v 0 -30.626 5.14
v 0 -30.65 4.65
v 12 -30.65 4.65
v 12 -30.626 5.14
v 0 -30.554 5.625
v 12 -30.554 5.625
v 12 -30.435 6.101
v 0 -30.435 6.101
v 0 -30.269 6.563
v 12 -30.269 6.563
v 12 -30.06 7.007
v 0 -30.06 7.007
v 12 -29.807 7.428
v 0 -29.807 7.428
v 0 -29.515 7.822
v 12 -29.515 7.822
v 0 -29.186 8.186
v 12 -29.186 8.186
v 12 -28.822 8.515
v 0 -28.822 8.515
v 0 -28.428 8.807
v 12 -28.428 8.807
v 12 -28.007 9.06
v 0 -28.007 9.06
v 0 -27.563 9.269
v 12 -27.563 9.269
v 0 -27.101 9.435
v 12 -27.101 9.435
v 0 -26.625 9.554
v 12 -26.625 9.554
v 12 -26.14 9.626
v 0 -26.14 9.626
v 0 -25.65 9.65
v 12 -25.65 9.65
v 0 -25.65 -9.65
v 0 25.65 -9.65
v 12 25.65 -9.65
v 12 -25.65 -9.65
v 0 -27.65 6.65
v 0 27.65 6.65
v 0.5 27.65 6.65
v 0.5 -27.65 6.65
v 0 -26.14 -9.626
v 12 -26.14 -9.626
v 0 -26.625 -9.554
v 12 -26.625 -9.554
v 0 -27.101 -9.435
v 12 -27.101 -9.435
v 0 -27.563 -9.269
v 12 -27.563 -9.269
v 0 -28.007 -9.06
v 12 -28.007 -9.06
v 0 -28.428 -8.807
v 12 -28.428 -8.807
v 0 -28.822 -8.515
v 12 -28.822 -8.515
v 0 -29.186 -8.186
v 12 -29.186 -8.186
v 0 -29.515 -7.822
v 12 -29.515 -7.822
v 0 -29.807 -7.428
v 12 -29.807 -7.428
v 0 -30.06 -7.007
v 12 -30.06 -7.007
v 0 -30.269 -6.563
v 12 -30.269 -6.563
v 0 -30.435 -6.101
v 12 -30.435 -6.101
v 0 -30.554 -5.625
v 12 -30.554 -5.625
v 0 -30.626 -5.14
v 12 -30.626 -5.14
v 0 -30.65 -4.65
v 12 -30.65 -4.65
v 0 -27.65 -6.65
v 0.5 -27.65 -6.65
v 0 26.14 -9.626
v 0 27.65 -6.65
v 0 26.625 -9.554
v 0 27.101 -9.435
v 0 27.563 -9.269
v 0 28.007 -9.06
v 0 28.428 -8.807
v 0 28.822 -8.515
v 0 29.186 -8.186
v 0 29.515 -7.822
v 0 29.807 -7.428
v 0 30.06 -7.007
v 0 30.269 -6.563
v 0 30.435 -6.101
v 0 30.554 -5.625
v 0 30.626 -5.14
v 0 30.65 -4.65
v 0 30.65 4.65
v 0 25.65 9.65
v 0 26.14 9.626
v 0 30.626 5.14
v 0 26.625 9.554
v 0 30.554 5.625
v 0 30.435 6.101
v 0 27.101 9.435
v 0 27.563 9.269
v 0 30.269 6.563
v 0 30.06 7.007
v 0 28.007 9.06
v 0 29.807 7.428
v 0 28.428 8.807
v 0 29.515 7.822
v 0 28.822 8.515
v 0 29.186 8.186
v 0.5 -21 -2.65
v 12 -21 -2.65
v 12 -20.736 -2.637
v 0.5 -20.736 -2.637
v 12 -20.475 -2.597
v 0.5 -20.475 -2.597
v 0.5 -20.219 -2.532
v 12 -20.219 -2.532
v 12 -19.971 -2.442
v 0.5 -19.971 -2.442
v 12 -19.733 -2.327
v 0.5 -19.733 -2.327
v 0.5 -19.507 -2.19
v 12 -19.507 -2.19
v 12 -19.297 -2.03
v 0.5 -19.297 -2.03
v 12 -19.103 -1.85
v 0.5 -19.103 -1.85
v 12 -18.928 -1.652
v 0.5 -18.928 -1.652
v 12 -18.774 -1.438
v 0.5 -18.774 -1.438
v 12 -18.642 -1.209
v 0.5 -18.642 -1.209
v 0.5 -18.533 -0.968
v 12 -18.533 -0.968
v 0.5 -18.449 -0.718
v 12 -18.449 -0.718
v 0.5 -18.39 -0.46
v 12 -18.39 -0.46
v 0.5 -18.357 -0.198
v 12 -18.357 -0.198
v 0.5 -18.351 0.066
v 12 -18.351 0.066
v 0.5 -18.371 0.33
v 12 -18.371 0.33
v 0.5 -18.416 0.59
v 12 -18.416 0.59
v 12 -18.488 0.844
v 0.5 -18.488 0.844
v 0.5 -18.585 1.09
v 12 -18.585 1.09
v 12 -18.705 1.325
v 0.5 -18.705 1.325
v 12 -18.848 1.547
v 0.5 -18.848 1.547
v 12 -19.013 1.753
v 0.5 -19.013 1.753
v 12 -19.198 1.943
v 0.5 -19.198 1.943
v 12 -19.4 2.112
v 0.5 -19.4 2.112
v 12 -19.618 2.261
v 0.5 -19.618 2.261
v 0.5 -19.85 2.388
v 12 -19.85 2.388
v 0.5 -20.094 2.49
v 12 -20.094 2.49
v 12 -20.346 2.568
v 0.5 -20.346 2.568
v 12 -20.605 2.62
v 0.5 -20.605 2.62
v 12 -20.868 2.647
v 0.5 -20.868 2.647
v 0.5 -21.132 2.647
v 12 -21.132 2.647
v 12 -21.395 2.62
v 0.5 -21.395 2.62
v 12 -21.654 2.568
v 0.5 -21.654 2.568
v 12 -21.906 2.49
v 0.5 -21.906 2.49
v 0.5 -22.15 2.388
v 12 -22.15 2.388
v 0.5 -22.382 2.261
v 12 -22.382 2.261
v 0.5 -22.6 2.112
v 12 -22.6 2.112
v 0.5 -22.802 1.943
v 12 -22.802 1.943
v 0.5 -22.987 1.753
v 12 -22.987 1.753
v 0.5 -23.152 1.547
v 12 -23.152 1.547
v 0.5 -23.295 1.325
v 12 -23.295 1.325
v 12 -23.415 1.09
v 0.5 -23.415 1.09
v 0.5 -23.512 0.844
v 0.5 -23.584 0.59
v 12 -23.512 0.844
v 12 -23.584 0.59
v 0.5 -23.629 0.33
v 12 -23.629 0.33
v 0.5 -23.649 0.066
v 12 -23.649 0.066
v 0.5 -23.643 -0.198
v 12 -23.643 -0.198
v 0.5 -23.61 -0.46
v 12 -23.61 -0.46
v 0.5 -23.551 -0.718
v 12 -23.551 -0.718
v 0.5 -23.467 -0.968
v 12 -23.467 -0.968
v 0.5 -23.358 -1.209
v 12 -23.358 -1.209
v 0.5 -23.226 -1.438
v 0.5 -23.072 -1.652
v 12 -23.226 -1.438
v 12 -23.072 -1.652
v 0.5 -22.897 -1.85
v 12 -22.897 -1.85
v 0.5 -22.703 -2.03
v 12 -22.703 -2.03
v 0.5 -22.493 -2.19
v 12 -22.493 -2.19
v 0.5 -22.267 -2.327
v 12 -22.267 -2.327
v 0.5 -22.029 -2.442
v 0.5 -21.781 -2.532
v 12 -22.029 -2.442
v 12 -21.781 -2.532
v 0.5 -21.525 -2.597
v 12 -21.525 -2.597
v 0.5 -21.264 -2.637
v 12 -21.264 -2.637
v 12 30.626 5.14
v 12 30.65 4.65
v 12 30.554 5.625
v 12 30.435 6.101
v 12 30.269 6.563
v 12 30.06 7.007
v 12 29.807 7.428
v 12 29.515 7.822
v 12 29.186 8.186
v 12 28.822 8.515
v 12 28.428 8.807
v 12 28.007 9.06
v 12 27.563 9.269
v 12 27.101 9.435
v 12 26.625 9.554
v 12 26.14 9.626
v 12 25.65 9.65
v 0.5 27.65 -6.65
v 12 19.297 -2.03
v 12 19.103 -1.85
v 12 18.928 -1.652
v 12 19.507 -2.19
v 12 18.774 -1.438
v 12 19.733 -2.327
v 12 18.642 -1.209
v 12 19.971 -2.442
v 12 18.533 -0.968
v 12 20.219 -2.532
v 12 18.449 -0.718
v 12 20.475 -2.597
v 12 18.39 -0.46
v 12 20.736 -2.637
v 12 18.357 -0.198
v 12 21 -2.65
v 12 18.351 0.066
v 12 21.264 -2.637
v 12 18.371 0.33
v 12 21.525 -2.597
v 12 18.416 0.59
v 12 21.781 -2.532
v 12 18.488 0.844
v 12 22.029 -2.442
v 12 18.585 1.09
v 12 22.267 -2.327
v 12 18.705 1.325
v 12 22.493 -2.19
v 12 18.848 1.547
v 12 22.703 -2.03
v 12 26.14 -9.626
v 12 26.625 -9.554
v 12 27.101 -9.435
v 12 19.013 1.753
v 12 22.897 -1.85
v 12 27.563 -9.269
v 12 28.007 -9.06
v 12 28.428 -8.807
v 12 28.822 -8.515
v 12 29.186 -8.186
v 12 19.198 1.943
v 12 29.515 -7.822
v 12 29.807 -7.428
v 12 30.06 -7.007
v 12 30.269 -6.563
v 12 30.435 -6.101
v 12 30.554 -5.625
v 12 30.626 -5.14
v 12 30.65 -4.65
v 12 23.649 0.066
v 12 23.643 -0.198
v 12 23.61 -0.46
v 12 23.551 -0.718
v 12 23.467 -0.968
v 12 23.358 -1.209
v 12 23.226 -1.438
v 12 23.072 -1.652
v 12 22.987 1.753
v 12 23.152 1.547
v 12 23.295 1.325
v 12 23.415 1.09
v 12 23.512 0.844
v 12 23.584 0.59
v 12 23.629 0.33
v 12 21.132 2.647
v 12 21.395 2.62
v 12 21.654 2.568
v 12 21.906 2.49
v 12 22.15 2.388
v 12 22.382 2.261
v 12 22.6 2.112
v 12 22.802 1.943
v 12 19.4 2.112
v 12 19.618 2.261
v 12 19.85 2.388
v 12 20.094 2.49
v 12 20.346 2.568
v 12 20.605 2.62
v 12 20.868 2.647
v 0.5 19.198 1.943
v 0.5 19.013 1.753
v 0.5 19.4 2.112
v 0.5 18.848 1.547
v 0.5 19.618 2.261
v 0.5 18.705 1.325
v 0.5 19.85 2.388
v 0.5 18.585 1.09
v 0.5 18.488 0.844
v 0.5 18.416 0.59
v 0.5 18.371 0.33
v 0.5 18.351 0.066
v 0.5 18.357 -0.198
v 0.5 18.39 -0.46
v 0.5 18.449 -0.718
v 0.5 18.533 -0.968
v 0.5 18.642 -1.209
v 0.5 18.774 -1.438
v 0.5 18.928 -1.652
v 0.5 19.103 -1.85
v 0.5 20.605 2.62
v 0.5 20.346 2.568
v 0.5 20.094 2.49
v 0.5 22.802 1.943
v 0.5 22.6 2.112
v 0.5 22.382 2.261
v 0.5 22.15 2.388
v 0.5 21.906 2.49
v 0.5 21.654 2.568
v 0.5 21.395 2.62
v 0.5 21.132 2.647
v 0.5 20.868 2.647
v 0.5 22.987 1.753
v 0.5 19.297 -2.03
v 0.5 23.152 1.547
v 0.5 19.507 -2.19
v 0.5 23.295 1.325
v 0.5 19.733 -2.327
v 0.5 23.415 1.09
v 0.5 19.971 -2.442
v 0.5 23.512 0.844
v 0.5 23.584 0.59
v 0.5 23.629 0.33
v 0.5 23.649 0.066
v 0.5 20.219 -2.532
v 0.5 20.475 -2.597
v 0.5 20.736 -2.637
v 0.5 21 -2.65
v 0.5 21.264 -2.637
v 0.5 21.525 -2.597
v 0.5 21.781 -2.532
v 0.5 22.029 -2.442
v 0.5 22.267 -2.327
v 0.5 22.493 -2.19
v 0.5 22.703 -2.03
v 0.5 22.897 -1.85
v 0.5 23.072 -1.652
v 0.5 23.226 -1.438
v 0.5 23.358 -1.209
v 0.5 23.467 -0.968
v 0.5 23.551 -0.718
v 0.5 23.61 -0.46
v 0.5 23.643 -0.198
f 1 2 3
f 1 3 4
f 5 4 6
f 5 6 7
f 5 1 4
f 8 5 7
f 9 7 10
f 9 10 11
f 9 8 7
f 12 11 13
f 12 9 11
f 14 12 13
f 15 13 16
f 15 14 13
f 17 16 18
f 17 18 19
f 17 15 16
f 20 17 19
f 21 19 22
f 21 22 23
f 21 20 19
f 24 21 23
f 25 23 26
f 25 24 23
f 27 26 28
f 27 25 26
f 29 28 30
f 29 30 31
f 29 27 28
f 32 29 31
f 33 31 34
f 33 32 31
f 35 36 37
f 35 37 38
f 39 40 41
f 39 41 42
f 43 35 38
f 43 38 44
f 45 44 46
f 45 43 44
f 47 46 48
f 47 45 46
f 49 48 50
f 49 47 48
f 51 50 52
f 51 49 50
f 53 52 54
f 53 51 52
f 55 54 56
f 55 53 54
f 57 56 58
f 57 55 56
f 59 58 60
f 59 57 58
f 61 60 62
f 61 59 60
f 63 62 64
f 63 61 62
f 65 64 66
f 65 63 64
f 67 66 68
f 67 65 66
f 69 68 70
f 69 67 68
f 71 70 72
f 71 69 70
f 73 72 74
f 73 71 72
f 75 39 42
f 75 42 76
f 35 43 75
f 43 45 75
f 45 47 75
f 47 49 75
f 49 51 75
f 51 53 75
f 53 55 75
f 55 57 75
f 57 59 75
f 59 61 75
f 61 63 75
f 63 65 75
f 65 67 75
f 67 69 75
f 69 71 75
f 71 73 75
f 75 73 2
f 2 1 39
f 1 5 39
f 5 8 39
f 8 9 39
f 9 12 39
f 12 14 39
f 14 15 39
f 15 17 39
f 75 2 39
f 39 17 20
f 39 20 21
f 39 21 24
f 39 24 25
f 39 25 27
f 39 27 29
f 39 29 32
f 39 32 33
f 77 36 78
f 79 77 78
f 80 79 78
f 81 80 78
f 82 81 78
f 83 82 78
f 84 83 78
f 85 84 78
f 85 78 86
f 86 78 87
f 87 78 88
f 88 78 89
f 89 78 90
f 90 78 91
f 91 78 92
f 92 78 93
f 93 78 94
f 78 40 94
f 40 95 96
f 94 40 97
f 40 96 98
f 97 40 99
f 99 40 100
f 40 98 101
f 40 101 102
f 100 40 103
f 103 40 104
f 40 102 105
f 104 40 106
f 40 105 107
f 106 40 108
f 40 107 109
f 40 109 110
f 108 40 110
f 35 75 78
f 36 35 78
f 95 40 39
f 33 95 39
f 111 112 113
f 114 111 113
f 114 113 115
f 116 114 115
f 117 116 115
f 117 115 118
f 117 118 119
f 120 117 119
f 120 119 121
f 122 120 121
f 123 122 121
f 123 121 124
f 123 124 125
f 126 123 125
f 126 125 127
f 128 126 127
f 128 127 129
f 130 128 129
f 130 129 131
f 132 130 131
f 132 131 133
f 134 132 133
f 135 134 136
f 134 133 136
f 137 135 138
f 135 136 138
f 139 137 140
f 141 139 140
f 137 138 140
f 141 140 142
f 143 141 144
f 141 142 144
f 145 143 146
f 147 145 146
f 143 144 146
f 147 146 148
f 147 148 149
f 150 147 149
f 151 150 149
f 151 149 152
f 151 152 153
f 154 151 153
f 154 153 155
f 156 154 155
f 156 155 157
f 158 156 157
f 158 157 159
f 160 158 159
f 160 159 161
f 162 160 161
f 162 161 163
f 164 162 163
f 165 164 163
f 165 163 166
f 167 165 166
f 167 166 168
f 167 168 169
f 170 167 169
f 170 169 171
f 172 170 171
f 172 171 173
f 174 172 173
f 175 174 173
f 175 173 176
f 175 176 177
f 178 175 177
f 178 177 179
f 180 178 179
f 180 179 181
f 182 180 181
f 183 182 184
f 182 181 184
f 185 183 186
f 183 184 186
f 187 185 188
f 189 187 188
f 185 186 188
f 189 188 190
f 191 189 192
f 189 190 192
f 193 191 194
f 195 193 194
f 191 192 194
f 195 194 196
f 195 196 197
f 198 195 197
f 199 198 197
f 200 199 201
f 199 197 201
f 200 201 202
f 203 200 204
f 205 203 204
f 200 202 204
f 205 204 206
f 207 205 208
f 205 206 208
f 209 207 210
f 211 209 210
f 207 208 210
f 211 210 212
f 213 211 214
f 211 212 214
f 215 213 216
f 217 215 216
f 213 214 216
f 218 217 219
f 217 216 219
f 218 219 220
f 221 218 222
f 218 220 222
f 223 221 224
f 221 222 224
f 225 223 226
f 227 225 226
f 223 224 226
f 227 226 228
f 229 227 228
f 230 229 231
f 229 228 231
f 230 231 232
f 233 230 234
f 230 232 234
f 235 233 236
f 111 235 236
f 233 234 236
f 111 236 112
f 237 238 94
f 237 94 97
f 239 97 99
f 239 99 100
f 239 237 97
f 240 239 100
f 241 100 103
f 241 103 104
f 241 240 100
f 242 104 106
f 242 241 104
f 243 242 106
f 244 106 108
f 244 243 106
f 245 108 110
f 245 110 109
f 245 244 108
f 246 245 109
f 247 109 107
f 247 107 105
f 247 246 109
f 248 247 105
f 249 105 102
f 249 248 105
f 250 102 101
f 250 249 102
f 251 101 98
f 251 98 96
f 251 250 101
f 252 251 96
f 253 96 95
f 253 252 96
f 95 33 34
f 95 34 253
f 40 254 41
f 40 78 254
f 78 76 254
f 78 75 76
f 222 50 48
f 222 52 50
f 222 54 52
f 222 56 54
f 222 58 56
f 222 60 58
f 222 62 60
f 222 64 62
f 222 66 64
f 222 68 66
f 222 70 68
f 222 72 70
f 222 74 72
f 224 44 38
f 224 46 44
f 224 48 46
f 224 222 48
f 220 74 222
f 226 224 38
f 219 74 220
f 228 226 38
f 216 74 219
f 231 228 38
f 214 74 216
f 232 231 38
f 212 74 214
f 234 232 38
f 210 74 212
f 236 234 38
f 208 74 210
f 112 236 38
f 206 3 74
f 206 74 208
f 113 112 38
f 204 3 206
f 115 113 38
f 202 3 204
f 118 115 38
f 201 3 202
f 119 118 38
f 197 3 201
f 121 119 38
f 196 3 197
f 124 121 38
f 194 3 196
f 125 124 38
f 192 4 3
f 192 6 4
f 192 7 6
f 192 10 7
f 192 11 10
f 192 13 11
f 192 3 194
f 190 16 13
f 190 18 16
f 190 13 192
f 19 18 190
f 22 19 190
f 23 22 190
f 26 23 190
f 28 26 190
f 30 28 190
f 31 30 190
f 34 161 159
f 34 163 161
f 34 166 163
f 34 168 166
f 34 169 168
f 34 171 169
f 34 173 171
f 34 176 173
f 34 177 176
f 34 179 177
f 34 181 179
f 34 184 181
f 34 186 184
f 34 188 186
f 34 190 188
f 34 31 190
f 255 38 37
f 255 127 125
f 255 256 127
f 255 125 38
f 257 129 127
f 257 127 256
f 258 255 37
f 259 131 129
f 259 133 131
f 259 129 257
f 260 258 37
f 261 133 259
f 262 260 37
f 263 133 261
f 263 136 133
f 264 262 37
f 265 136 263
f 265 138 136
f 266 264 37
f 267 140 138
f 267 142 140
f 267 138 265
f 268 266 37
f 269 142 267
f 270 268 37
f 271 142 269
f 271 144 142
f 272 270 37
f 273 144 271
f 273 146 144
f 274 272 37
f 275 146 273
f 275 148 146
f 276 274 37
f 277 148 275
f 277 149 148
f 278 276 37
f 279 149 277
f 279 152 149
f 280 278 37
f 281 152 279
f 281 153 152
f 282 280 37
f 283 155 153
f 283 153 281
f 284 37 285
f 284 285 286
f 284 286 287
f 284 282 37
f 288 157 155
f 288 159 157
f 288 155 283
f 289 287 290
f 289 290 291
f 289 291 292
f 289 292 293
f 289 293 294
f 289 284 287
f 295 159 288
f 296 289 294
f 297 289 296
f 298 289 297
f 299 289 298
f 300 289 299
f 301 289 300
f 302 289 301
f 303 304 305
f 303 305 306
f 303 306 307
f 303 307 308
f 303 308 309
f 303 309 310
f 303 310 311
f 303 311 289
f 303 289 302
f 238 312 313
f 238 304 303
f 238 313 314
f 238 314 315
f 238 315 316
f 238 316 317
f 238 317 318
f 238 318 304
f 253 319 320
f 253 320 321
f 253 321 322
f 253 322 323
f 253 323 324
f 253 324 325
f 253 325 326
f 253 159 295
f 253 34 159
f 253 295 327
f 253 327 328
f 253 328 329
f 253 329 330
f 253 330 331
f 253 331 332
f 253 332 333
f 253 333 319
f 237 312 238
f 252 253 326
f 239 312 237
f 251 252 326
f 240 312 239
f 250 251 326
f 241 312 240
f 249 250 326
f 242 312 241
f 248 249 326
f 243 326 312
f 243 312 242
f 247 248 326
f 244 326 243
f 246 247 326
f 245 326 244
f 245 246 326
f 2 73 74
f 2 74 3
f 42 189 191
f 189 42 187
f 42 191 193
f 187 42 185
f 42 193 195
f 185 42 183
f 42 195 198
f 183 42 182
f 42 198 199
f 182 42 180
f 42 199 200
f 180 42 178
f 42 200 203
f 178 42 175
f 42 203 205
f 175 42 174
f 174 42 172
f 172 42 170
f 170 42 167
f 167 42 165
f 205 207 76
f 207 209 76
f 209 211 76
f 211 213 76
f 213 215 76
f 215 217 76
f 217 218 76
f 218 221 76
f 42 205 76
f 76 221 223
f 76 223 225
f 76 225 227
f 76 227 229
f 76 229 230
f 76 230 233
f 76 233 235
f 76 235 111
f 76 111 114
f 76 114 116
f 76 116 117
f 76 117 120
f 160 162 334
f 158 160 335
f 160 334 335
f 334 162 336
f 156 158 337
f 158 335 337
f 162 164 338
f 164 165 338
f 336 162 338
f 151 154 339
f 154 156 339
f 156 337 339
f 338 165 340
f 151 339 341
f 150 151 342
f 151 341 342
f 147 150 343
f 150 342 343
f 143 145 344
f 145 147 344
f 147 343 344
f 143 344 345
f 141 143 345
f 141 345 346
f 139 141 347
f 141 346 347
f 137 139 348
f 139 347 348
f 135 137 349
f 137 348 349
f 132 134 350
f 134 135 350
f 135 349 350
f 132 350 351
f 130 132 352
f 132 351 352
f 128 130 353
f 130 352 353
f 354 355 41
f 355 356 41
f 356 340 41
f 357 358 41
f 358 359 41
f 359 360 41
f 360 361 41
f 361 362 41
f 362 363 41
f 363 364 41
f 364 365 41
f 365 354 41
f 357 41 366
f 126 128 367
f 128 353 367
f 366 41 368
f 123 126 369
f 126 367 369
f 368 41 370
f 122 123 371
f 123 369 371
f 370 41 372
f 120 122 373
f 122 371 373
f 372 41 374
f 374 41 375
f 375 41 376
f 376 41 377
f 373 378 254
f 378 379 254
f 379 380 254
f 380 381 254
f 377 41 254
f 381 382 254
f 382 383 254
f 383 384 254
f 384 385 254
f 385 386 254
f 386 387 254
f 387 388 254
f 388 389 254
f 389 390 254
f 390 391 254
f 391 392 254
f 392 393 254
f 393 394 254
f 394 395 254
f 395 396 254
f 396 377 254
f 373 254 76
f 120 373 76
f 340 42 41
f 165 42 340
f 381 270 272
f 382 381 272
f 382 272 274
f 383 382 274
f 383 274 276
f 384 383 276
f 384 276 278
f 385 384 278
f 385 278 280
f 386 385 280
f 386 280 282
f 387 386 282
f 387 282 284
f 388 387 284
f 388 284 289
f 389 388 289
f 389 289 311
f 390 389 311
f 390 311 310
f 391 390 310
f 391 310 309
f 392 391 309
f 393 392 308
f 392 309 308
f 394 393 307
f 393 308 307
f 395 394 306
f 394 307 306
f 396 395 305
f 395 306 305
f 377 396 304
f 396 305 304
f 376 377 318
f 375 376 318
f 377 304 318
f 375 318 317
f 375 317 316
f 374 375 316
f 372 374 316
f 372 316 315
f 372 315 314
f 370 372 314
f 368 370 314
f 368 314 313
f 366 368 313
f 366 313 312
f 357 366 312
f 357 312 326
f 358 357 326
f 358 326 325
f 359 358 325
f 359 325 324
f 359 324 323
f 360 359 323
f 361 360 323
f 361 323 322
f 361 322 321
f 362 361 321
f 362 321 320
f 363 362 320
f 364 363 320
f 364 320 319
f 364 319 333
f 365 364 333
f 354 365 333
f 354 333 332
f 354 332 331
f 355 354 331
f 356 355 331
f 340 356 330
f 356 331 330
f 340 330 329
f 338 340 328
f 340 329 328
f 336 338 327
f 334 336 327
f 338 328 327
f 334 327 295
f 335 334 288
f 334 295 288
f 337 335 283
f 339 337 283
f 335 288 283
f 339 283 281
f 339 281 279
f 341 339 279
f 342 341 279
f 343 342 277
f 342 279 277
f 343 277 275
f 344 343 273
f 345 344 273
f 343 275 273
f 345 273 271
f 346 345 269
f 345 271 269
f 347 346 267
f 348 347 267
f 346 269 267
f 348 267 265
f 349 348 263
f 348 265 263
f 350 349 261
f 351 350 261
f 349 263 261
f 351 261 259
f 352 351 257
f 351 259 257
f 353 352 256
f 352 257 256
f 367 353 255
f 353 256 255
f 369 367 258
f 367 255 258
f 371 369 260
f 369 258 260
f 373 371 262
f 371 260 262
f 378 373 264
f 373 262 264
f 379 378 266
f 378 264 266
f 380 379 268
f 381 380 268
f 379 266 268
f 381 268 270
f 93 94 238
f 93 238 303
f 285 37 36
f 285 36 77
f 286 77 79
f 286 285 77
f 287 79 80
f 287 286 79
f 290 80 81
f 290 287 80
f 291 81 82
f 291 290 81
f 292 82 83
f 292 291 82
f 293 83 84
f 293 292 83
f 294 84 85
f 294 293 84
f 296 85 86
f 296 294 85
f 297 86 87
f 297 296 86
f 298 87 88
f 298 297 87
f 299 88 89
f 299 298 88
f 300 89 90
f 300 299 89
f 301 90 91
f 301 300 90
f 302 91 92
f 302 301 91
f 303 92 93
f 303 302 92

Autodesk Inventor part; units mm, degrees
ref_plane "YZ Plane" through (0, 0, 0) normal (1, 0, 0) x (0, 1, 0)
ref_plane "XZ Plane" through (0, 0, 0) normal (0, 1, 0) x (-1, 0, 0)
ref_plane "XY Plane" through (0, 0, 0) normal (0, 0, 1) x (1, 0, 0)
sketch "Sketch1" plane through (0, 0, 0) normal (1, 0, 0) x (0, 1, 0)
  line L0 (27.65, 6.65) -> (-27.65, 6.65)
  line L1 (-27.65, 6.65) -> (-27.65, -6.65)
  line L2 (-27.65, -6.65) -> (27.65, -6.65)
  line L3 (27.65, -6.65) -> (27.65, 6.65)
  line L4 (27.65, 6.65) -> (-27.65, -6.65) construction
  line L5 (-27.65, 6.65) -> (27.65, -6.65) construction
  line L6 (30.65, -9.65) -> (-30.65, -9.65)
  line L7 (-30.65, -9.65) -> (-30.65, 9.65)
  line L8 (-30.65, 9.65) -> (30.65, 9.65)
  line L9 (30.65, 9.65) -> (30.65, -9.65)
  point P0 (0, 0)
  dimension "d0" = 55.3
  dimension "d1" = 13.3
  dimension "d2" = 3
extrude "Extrusion1" add sketch "Sketch1" along normal blind 12
sketch "Sketch2" plane through (12, 0, 0) normal (1, 0, 0) x (0, 0, -1)
  line L0 (-9.65, 30.65) -> (-9.65, -30.65) projected
  line L1 (-9.65, -30.65) -> (9.65, -30.65) projected
  line L2 (9.65, -30.65) -> (9.65, 30.65) projected
  line L3 (9.65, 30.65) -> (-9.65, 30.65) projected
  line L4 (-6.65, 27.65) -> (6.65, 27.65) projected
  line L5 (6.65, 27.65) -> (6.65, -27.65) projected
  line L6 (6.65, -27.65) -> (-6.65, -27.65) projected
  line L7 (-6.65, -27.65) -> (-6.65, 27.65) projected
  point P0 (0, 0)
extrude "Extrusion2" add sketch "Sketch2" against normal blind 11.5 contours L3 L2 L1 L0 | L4 L5 L6 L7
sketch "Sketch3" plane through (12, 0, 0) normal (1, 0, 0) x (0, 0, -1)
  line L0 (0, 0) -> (0, 21)
  line L1 (0, 0) -> (5, 0)
  circle A0 centre (0, 21) radius 2.65
  circle A1 centre (0, -21) radius 2.65
  dimension "d7" = 21
  dimension "d8" = 5
  dimension "d9" = 5.3
extrude "Extrusion3" cut sketch "Sketch3" against normal blind 13
fillet "Fillet1" radius 5 4 edges at (6, 30.65, 9.65) (6, 30.65, -9.65) (6, -30.65, -9.65) (6, -30.65, 9.65)
properties part number "TOPE_CHUMACERA"
